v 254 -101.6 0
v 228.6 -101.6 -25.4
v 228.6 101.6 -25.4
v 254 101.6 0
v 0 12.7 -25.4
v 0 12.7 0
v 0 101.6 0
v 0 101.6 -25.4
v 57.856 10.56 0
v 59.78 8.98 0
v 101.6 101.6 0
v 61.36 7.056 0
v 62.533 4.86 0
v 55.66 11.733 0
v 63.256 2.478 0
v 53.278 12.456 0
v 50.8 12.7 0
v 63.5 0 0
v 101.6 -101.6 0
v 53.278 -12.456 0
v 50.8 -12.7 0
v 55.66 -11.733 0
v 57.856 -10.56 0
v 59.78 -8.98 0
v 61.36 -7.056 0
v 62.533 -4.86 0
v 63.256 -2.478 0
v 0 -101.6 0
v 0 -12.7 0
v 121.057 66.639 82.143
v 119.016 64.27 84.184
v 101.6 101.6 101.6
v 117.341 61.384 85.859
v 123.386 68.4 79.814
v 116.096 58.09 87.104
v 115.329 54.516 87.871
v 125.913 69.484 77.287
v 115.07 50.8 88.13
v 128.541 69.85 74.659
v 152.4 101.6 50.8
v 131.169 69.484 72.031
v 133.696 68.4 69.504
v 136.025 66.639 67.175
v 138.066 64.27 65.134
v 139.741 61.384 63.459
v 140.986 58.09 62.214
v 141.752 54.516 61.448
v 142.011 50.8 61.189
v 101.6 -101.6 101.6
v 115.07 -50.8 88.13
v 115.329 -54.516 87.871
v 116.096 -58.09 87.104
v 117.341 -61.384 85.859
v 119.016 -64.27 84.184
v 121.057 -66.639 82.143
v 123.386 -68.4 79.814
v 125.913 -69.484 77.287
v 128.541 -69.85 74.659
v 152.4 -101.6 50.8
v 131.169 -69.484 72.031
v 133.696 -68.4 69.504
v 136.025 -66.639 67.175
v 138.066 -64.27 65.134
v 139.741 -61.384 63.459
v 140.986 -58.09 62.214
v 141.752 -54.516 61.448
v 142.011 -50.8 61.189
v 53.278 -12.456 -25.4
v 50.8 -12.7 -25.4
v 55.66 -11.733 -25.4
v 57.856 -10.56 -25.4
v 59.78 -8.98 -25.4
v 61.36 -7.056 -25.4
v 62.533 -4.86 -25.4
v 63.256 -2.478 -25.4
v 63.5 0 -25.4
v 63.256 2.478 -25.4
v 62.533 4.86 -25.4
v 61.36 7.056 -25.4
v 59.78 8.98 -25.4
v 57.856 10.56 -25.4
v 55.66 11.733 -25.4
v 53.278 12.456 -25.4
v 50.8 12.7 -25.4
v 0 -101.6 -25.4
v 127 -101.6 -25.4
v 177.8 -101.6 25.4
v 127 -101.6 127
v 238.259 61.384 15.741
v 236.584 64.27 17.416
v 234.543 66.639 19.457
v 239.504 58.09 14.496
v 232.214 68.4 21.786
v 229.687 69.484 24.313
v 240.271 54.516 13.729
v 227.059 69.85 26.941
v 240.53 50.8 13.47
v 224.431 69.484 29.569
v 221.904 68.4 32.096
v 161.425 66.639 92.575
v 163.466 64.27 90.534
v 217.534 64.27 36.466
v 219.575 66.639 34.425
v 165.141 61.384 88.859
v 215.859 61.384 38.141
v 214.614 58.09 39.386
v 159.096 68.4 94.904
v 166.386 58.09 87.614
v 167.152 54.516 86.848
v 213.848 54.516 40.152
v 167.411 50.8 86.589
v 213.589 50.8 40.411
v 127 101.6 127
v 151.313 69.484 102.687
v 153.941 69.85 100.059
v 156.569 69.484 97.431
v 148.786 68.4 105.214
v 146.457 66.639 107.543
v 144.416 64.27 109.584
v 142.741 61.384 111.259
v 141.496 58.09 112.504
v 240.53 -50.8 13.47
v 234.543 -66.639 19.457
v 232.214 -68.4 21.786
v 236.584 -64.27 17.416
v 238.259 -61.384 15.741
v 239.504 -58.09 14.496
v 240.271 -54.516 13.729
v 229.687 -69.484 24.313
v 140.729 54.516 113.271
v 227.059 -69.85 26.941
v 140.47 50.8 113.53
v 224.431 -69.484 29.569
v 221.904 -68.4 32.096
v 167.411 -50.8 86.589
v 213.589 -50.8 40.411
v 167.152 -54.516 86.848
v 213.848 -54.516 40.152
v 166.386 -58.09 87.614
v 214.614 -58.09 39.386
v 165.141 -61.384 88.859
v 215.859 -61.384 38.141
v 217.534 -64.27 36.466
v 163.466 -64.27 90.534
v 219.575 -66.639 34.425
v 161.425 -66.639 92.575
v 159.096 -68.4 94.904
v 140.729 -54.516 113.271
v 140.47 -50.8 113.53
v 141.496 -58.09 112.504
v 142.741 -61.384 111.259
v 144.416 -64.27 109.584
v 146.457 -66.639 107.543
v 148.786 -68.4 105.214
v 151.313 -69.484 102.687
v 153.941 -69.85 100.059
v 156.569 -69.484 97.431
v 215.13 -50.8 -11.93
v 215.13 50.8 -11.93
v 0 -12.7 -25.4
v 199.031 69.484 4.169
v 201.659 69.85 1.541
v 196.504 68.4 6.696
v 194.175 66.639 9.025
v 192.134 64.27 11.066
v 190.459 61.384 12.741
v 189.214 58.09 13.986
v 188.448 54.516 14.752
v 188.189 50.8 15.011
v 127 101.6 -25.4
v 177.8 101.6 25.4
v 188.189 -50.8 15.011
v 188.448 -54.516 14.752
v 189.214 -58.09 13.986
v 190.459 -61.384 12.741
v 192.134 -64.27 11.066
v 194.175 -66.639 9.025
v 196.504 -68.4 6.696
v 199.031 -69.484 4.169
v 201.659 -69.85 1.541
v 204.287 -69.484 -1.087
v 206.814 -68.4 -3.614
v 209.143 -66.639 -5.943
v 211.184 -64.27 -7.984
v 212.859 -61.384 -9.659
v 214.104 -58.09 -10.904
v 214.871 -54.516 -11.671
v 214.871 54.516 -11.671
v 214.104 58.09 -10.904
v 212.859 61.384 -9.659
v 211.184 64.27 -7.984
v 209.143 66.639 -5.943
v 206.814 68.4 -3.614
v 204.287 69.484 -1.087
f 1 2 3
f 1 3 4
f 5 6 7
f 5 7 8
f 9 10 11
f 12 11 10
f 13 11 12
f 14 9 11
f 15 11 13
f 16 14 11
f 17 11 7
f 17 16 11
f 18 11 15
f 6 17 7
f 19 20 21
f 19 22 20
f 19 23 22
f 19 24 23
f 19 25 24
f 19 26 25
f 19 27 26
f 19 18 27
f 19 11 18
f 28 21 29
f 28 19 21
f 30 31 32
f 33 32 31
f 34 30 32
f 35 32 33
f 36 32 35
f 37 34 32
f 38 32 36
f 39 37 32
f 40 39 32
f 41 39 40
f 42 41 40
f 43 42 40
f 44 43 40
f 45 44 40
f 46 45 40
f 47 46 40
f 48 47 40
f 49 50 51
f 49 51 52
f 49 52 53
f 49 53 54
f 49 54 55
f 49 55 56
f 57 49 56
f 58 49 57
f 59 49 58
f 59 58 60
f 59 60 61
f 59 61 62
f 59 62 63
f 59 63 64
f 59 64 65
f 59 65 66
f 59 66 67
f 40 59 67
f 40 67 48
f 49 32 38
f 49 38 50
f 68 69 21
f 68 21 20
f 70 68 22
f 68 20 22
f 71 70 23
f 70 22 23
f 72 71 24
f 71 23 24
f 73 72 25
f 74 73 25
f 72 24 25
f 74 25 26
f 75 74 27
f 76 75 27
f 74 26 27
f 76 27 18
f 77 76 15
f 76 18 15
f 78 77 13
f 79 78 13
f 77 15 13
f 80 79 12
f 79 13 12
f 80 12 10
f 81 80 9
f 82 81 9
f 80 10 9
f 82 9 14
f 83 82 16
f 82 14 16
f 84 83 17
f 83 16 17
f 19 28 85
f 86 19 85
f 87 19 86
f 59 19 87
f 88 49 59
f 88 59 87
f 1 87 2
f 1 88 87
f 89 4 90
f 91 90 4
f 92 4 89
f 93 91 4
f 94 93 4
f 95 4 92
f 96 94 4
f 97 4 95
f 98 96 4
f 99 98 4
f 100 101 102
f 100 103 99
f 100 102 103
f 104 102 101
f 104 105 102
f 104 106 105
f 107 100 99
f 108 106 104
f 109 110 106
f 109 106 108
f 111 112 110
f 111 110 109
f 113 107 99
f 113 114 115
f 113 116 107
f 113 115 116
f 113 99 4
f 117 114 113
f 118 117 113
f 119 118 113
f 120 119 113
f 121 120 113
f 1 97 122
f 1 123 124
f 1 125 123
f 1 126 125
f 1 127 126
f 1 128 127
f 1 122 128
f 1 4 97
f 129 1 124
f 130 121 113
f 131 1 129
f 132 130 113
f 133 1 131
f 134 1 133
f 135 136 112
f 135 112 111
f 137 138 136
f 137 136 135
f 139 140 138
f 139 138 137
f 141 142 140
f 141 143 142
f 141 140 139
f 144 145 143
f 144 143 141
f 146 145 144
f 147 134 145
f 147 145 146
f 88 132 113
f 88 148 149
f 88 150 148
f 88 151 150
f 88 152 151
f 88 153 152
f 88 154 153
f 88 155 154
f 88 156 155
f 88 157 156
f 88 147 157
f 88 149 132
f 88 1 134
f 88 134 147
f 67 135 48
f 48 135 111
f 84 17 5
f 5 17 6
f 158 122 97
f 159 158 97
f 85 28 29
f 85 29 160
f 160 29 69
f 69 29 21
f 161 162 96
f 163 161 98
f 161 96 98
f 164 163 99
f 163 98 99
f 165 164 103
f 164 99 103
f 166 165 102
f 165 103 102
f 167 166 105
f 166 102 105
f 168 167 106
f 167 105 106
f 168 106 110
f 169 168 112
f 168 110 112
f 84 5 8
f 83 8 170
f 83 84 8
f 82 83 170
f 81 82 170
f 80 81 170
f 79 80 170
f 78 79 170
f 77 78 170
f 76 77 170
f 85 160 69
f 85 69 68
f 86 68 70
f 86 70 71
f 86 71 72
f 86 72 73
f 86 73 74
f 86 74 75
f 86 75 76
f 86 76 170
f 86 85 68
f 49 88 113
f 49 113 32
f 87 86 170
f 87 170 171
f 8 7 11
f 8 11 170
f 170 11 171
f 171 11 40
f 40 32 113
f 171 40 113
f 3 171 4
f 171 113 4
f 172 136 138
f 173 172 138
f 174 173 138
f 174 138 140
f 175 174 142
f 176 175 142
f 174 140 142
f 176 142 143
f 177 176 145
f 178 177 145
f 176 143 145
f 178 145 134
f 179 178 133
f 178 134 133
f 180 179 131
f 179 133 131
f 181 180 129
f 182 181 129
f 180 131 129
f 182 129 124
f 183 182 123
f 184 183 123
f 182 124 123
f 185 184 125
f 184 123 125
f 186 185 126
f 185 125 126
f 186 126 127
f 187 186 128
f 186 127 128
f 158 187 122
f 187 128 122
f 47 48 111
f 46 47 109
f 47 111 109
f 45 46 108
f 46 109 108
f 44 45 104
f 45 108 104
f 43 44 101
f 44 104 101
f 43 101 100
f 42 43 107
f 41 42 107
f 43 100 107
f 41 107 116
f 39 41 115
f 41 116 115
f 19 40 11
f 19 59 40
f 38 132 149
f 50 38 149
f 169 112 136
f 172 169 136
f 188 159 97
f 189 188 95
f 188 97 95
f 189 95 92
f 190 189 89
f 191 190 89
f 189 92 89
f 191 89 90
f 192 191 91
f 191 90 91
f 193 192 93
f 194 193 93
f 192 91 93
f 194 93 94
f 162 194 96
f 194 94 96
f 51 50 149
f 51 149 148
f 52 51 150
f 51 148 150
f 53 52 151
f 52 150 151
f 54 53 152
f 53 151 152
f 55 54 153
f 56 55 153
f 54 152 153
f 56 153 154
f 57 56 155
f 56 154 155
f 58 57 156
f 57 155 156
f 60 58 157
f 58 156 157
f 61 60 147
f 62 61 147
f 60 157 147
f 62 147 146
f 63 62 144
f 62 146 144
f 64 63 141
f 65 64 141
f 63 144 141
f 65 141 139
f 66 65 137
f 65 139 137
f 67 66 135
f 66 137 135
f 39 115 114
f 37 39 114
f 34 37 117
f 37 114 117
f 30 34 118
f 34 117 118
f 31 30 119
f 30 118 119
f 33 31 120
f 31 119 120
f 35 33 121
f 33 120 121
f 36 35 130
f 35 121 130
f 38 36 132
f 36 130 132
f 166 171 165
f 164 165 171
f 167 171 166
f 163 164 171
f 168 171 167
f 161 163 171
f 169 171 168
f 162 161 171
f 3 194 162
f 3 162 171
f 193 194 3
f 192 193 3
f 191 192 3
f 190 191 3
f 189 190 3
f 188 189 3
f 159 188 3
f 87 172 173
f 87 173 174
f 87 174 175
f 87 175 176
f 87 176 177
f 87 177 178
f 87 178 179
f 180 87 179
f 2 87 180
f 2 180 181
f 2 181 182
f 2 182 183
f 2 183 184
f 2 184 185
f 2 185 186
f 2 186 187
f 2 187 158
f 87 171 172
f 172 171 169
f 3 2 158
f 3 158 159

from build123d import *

# Parameters (mm, degrees)
F1_DEPTH = 101.6
F3_DEPTH = 40.894
F5_DEPTH = 25.401


with BuildPart() as f1:
    # F0 (on Front) → F1 (new body, symmetric)
    with BuildSketch(Plane.XZ):
        Polygon((101.6, 0), (0, 0), (0, -25.4), (127, -25.4), (177.8, 25.4), (228.6, -25.4), (254, 0), (127, 127), (101.6, 101.6), (152.4, 50.8), align=None)
    extrude(amount=F1_DEPTH, both=True)

    # F2 (on face) → F3 (cut)
    with BuildSketch(Plane(origin=(127, 0, 127), x_dir=(0, 1, 0), z_dir=(0.707107, 0, 0.707107))):
        with BuildLine():
            ThreePointArc((-50.8, -19.05), (-37.329616, -24.629616), (-31.75, -38.1))
            ThreePointArc((-31.75, -38.1), (-37.329616, -51.570384), (-50.8, -57.15))
            Line((-50.8, -57.15), (50.8, -57.15))
            ThreePointArc((50.8, -57.15), (31.75, -38.1), (50.8, -19.05))
            Line((50.8, -19.05), (-50.8, -19.05))
        make_face()
        with BuildLine():
            ThreePointArc((-50.8, -57.15), (-37.329616, -51.570384), (-31.75, -38.1))
            ThreePointArc((-31.75, -38.1), (-37.329616, -24.629616), (-50.8, -19.05))
            ThreePointArc((-50.8, -19.05), (-69.85, -38.1), (-50.8, -57.15))
        make_face()
        with BuildLine():
            ThreePointArc((69.85, -38.1), (64.270384, -24.629616), (50.8, -19.05))
            ThreePointArc((50.8, -19.05), (31.75, -38.1), (50.8, -57.15))
            ThreePointArc((50.8, -57.15), (64.270384, -51.570384), (69.85, -38.1))
        make_face()
        with BuildLine():
            ThreePointArc((69.85, -141.505122), (64.270384, -128.034738), (50.8, -122.455122))
            ThreePointArc((50.8, -122.455122), (31.75, -141.505122), (50.8, -160.555122))
            ThreePointArc((50.8, -160.555122), (64.270384, -154.975507), (69.85, -141.505122))
        make_face()
        with BuildLine():
            ThreePointArc((-50.8, -122.455122), (-37.329616, -128.034738), (-31.75, -141.505122))
            ThreePointArc((-31.75, -141.505122), (-37.329616, -154.975507), (-50.8, -160.555122))
            Line((-50.8, -160.555122), (50.8, -160.555122))
            ThreePointArc((50.8, -160.555122), (31.75, -141.505122), (50.8, -122.455122))
            Line((50.8, -122.455122), (-50.8, -122.455122))
        make_face()
        with BuildLine():
            ThreePointArc((-50.8, -160.555122), (-37.329616, -154.975507), (-31.75, -141.505122))
            ThreePointArc((-31.75, -141.505122), (-37.329616, -128.034738), (-50.8, -122.455122))
            ThreePointArc((-50.8, -122.455122), (-69.85, -141.505122), (-50.8, -160.555122))
        make_face()
    extrude(amount=-F3_DEPTH, mode=Mode.SUBTRACT)

    # F4 (on face) → F5 (cut, through all)
    with BuildSketch(Plane.XY):
        with BuildLine():
            Line((0, -12.7), (50.8, -12.7))
            ThreePointArc((50.8, -12.7), (63.5, 0), (50.8, 12.7))
            Line((50.8, 12.7), (0, 12.7))
            Line((0, 12.7), (0, 0))
            Line((0, 0), (0, -12.7))
        make_face()
    extrude(amount=-F5_DEPTH, mode=Mode.SUBTRACT)


solid = f1.part
